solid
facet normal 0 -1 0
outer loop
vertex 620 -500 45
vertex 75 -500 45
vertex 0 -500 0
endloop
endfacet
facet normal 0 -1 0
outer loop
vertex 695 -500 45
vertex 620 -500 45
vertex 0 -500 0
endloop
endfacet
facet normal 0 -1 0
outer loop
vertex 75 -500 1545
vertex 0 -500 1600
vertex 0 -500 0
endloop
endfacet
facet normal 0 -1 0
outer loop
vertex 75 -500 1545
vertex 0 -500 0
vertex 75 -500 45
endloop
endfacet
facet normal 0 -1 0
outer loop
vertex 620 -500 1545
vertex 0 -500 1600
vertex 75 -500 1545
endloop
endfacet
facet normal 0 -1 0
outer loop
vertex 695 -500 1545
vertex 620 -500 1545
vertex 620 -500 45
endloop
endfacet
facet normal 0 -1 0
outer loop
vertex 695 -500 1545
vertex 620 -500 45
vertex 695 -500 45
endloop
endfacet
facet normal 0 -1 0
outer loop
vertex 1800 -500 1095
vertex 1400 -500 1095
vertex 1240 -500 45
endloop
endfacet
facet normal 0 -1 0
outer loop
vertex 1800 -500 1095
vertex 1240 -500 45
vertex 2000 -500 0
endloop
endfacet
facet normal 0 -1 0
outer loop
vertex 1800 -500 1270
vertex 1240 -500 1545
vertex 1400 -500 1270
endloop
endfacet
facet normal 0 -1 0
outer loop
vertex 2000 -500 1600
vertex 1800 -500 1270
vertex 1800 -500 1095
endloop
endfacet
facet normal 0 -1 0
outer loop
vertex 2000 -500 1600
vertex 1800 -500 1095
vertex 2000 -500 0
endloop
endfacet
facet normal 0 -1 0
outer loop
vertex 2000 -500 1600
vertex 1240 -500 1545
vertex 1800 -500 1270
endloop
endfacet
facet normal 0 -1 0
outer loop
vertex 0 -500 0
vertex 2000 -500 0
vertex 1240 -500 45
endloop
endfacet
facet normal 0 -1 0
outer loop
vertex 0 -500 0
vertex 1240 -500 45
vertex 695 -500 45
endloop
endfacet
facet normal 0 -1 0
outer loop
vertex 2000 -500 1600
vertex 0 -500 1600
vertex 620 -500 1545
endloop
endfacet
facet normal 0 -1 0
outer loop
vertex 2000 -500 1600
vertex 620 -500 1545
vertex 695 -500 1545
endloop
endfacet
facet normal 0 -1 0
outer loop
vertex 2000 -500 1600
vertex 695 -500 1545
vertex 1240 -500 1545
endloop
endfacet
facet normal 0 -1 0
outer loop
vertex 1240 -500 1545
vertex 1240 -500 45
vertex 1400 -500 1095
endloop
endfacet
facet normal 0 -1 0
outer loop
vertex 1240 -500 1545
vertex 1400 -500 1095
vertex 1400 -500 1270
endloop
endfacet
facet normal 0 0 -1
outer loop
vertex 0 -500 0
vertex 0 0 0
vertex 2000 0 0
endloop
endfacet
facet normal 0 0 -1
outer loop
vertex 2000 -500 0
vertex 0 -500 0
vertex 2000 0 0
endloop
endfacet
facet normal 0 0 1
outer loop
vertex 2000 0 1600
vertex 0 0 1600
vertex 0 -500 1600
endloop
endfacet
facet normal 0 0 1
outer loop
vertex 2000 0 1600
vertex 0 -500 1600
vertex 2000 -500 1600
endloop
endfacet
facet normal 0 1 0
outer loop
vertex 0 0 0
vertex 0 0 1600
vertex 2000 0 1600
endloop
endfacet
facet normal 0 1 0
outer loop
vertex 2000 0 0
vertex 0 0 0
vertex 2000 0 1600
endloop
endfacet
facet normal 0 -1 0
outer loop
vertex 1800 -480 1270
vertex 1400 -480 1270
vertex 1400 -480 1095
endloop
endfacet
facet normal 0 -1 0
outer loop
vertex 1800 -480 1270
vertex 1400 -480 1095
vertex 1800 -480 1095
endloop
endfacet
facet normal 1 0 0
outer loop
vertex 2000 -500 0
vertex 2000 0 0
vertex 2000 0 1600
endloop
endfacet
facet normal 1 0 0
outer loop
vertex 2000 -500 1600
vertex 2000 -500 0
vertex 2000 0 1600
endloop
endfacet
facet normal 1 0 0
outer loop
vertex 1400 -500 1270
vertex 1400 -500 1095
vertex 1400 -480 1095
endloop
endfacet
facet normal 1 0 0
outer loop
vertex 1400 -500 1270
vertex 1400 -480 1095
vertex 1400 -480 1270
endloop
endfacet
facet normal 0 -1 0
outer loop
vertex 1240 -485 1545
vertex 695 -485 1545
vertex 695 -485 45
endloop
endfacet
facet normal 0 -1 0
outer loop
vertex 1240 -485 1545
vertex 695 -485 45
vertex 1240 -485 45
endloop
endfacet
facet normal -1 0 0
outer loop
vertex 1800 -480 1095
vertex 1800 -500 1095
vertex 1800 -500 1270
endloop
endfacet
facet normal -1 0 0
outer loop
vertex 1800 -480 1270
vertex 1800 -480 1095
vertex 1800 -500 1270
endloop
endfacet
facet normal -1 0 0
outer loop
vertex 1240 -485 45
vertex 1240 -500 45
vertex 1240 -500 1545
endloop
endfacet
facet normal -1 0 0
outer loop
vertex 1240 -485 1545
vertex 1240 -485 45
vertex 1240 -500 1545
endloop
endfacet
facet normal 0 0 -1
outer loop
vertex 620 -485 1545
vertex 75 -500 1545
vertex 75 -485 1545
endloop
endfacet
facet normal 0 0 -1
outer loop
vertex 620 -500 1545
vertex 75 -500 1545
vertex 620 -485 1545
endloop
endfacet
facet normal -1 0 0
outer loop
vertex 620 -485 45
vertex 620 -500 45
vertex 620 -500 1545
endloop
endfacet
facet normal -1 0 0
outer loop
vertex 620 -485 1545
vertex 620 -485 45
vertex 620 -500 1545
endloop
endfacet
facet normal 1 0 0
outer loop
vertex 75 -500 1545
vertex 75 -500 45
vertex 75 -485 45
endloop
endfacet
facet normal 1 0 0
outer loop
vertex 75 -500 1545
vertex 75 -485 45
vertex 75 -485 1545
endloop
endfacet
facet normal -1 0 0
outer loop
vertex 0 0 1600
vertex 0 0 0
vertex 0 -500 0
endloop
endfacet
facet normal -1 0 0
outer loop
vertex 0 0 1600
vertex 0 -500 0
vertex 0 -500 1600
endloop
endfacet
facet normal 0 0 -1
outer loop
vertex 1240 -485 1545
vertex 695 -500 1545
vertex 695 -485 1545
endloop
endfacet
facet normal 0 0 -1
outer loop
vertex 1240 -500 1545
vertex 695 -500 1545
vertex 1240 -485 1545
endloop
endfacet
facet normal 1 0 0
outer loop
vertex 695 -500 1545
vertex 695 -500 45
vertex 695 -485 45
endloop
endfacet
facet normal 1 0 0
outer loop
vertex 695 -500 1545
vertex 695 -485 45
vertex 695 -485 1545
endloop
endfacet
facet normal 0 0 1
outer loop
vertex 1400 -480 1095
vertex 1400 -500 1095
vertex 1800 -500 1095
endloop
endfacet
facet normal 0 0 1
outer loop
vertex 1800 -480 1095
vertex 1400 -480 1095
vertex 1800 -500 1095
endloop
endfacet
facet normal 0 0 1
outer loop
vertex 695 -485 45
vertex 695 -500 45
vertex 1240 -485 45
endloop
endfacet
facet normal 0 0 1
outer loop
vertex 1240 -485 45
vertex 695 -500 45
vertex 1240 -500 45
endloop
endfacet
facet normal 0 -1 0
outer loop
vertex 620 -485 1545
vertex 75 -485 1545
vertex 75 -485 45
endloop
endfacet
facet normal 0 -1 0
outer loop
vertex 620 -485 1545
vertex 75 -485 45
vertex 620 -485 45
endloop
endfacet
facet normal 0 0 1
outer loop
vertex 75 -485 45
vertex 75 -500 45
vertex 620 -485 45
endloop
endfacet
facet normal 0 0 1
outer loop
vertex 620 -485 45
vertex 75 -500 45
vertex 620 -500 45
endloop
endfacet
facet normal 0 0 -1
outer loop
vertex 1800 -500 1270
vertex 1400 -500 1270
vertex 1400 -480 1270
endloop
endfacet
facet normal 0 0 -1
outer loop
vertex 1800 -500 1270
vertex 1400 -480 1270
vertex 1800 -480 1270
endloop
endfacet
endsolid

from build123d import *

# Parameters (mm, degrees)
F0_W     = 2000
F0_H     = 1600
F1_DEPTH = 500
F2_W     = 400
F2_H     = 175
F3_DEPTH = 20
F4_W     = 545
F4_H     = 1500
F5_DEPTH = 15


with BuildPart() as f1:
    # F0 (on Front) → F1 (new body)
    with BuildSketch(Plane.XZ):
        with Locations((1000, 800)):
            Rectangle(F0_W, F0_H)
    extrude(amount=F1_DEPTH)

    # F2 (on face) → F3 (cut)
    with BuildSketch(Plane.XZ.offset(500)):
        with Locations((1600, 1182.5)):
            Rectangle(F2_W, F2_H)
    extrude(amount=-F3_DEPTH, mode=Mode.SUBTRACT)

    # F4 (on face) → F5 (cut)
    with BuildSketch(Plane.XZ.offset(500)):
        with Locations((347.5, 795)):
            Rectangle(F4_W, F4_H)
        with Locations((967.5, 795)):
            Rectangle(F4_W, F4_H)
    extrude(amount=-F5_DEPTH, mode=Mode.SUBTRACT)


solid = f1.part
